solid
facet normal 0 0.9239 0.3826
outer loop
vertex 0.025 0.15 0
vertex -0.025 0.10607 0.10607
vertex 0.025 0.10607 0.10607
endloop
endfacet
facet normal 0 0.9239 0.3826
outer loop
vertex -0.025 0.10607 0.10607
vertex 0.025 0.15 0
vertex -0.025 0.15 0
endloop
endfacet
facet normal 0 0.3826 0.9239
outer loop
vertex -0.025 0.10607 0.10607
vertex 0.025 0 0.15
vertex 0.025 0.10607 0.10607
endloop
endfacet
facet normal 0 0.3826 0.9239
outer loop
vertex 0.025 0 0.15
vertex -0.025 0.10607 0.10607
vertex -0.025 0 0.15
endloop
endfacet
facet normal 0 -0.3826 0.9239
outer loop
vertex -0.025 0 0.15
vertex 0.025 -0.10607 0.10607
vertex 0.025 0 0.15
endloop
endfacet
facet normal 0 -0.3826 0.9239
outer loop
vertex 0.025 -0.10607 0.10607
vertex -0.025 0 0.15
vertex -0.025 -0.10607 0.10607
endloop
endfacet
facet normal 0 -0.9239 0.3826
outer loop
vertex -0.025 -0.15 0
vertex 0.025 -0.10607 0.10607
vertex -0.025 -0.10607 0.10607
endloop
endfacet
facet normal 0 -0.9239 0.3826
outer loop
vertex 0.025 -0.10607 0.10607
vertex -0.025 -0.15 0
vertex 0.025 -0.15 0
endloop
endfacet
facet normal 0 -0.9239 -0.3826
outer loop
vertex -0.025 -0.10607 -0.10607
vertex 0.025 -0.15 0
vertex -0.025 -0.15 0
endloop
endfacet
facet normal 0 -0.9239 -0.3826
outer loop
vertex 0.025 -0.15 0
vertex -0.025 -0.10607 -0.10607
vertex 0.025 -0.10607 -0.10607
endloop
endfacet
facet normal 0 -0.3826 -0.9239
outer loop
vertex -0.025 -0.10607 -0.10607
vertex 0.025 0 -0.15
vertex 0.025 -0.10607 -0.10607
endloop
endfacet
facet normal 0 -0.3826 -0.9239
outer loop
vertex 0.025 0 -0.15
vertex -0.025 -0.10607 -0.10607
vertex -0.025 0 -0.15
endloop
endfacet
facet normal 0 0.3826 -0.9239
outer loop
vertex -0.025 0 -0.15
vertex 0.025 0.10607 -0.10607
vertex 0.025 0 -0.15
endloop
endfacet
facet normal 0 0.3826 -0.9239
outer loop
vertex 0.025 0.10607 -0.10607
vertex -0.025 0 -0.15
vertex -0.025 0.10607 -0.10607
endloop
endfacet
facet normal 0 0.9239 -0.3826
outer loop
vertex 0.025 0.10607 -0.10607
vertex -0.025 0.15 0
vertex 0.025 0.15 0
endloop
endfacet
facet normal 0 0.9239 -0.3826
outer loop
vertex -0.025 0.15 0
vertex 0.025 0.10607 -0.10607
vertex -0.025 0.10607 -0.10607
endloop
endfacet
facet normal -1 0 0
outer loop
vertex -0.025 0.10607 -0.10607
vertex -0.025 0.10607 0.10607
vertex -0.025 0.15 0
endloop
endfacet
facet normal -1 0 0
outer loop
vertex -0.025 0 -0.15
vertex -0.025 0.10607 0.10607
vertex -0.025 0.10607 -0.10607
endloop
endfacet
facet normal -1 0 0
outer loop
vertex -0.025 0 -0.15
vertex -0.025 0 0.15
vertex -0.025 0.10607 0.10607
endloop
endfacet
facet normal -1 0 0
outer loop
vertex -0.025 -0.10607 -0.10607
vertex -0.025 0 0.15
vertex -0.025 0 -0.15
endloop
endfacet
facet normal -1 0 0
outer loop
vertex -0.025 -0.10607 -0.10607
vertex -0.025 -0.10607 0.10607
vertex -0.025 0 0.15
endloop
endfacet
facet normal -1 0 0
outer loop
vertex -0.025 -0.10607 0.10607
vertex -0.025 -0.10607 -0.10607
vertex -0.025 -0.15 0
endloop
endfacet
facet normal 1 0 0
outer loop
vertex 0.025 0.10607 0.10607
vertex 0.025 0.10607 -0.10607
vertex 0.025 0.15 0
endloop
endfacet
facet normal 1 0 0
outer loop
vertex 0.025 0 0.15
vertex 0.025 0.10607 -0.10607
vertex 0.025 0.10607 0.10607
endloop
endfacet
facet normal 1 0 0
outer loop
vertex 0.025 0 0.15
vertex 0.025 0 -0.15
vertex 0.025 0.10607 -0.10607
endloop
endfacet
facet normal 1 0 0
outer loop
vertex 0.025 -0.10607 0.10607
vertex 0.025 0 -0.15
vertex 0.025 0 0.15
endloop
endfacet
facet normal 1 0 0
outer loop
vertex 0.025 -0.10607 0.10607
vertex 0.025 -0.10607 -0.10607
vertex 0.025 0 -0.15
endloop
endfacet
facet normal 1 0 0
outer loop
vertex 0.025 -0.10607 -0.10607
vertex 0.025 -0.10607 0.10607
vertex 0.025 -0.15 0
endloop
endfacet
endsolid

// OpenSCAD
use <lib.scad>

module base() {
	translate([0,0,0.625]) hull() {
		translate([0,0,-0.5]) box([1.8,1.8,0.25]);
		translate([0,0,0.5]) box([0.35,0.35,0.25]);
	}
}

module mountHD($fn=72) {
	translate([0,0,1.3]) union() {
		cyl(0.4,0.4,0.2);
		for (i = [-1:2:1]) translate([0,i*0.41,0]) hull() {
			box([0.2,0.2,0.2]);
			translate([-0.3,0,0.7]) box([0.2,0.2,0.2]);
		}
	}
}

module mountLD($fn=8) {
	translate([0,0,1.3]) union() {
		cyl(0.4,0.4,0.2);
		for (i = [-1:2:1]) translate([0,i*0.41,0]) hull() {
			box([0.2,0.2,0.2]);
			translate([-0.3,0,0.7]) box([0.2,0.2,0.2]);
		}
	}
}

module butt() {
	box([0.6,0.6,0.6]);
}

module barrelHD() {
	rotate([0,0,90]) rotate([90,0,0]) difference() {
		union() {
			for (i = [0:60:300]) rotate([0,0,i]) translate([0,0.12,0]) difference() {
				cyl(0.05,0.05,1.0,$fn=32);
			}
			minkowskiOutsideRound(0.01,$fn=8) translate([0,0,-0.4]) cyl(0.2,0.2,0.2,$fn=64);
			minkowskiOutsideRound(0.01,$fn=8) translate([0,0,0.35]) cyl(0.2,0.2,0.1,$fn=64);
		}
		for (i = [0:60:300]) rotate([0,0,i]) translate([0,0.12,0]) difference() {
			translate([0,0,0.25]) cyl(0.03,0.03,1,$fn=24);
		}
	}
}

module barrelLD($fn=8) {
	rotate([0,0,90]) rotate([90,0,0]) union() {
		for (i = [0:60:300]) rotate([0,0,i]) translate([0,0.12,0]) difference() {
			cyl(0.05,0.05,1.0);
			//translate([0,0,0.5]) cyl(0.03,0.03,0.1);
		}
		translate([0,0,-0.4]) cyl(0.2,0.2,0.2);
		translate([0,0,0.35]) cyl(0.2,0.2,0.1);
	}
}

module barrelVLD($fn=6) {
	rotate([0,0,90]) rotate([90,0,0]) union() {
		cyl(0.18,0.18,1.0);
	}
}

module burstHD($fn=12) {
	hull() {
		sphere(0.03);
		translate([-0.1,0,0]) sphere(0.02);
		translate([2.0,0,0]) box([0.001,0.001,0.001]);
	}
}

module burstLD($fn=6) {
	hull() {
		box([0.06,0.06,0.06]);
		translate([-0.1,0,0]) box([0.04,0.04,0.04]);
		translate([2.0,0,0]) box([0.001,0.001,0.001]);
	}
}

module laserHD() {
	rotate([0,0,90]) rotate([90,0,0]) difference() {
		union() {
			cyl(0.05,0.05,1.0,$fn=24);
			translate([0,0,-0.4]) cyl(0.2,0.2,0.2,$fn=24);
		}
		cyl(0.04,0.04,1.1,$fn=24);
	}
}

module laserLD() {
	rotate([0,0,90]) rotate([90,0,0]) difference() {
		union() {
			cyl(0.05,0.05,1.0,$fn=8);
			translate([0,0,-0.4]) cyl(0.2,0.2,0.2,$fn=8);
		}
	}
}

module laserVLD() {
	rotate([0,0,90]) rotate([90,0,0]) difference() {
		union() {
			cyl(0.05,0.05,1.0,$fn=8);
			translate([0,0,-0.4]) cyl(0.2,0.2,0.2,$fn=8);
			cyl(0.15,0.15,0.6,$fn=8);
		}
	}
}

module laserRingHD() {
	rotate([0,0,90]) rotate([90,0,0]) cyl(0.15,0.15,0.05,$fn=24);
}

module laserRingLD() {
	rotate([0,0,90]) rotate([90,0,0]) cyl(0.15,0.15,0.05,$fn=8);
}

//base();
//fillet(0.01,$fn=8) base($fn=72);
//minkowskiOutsideRound(0.01,$fn=8) mountHD();
//mountLD();
//fillet(0.01,$fn=8) butt($fn=72);
//barrelHD();
//barrelLD();
//barrelVLD();
//burstHD();
//burstLD();
//laserHD();
//laserLD();
//laserVLD();
//laserRingHD();
laserRingLD();

//base();
//butt();
//mountLD();
